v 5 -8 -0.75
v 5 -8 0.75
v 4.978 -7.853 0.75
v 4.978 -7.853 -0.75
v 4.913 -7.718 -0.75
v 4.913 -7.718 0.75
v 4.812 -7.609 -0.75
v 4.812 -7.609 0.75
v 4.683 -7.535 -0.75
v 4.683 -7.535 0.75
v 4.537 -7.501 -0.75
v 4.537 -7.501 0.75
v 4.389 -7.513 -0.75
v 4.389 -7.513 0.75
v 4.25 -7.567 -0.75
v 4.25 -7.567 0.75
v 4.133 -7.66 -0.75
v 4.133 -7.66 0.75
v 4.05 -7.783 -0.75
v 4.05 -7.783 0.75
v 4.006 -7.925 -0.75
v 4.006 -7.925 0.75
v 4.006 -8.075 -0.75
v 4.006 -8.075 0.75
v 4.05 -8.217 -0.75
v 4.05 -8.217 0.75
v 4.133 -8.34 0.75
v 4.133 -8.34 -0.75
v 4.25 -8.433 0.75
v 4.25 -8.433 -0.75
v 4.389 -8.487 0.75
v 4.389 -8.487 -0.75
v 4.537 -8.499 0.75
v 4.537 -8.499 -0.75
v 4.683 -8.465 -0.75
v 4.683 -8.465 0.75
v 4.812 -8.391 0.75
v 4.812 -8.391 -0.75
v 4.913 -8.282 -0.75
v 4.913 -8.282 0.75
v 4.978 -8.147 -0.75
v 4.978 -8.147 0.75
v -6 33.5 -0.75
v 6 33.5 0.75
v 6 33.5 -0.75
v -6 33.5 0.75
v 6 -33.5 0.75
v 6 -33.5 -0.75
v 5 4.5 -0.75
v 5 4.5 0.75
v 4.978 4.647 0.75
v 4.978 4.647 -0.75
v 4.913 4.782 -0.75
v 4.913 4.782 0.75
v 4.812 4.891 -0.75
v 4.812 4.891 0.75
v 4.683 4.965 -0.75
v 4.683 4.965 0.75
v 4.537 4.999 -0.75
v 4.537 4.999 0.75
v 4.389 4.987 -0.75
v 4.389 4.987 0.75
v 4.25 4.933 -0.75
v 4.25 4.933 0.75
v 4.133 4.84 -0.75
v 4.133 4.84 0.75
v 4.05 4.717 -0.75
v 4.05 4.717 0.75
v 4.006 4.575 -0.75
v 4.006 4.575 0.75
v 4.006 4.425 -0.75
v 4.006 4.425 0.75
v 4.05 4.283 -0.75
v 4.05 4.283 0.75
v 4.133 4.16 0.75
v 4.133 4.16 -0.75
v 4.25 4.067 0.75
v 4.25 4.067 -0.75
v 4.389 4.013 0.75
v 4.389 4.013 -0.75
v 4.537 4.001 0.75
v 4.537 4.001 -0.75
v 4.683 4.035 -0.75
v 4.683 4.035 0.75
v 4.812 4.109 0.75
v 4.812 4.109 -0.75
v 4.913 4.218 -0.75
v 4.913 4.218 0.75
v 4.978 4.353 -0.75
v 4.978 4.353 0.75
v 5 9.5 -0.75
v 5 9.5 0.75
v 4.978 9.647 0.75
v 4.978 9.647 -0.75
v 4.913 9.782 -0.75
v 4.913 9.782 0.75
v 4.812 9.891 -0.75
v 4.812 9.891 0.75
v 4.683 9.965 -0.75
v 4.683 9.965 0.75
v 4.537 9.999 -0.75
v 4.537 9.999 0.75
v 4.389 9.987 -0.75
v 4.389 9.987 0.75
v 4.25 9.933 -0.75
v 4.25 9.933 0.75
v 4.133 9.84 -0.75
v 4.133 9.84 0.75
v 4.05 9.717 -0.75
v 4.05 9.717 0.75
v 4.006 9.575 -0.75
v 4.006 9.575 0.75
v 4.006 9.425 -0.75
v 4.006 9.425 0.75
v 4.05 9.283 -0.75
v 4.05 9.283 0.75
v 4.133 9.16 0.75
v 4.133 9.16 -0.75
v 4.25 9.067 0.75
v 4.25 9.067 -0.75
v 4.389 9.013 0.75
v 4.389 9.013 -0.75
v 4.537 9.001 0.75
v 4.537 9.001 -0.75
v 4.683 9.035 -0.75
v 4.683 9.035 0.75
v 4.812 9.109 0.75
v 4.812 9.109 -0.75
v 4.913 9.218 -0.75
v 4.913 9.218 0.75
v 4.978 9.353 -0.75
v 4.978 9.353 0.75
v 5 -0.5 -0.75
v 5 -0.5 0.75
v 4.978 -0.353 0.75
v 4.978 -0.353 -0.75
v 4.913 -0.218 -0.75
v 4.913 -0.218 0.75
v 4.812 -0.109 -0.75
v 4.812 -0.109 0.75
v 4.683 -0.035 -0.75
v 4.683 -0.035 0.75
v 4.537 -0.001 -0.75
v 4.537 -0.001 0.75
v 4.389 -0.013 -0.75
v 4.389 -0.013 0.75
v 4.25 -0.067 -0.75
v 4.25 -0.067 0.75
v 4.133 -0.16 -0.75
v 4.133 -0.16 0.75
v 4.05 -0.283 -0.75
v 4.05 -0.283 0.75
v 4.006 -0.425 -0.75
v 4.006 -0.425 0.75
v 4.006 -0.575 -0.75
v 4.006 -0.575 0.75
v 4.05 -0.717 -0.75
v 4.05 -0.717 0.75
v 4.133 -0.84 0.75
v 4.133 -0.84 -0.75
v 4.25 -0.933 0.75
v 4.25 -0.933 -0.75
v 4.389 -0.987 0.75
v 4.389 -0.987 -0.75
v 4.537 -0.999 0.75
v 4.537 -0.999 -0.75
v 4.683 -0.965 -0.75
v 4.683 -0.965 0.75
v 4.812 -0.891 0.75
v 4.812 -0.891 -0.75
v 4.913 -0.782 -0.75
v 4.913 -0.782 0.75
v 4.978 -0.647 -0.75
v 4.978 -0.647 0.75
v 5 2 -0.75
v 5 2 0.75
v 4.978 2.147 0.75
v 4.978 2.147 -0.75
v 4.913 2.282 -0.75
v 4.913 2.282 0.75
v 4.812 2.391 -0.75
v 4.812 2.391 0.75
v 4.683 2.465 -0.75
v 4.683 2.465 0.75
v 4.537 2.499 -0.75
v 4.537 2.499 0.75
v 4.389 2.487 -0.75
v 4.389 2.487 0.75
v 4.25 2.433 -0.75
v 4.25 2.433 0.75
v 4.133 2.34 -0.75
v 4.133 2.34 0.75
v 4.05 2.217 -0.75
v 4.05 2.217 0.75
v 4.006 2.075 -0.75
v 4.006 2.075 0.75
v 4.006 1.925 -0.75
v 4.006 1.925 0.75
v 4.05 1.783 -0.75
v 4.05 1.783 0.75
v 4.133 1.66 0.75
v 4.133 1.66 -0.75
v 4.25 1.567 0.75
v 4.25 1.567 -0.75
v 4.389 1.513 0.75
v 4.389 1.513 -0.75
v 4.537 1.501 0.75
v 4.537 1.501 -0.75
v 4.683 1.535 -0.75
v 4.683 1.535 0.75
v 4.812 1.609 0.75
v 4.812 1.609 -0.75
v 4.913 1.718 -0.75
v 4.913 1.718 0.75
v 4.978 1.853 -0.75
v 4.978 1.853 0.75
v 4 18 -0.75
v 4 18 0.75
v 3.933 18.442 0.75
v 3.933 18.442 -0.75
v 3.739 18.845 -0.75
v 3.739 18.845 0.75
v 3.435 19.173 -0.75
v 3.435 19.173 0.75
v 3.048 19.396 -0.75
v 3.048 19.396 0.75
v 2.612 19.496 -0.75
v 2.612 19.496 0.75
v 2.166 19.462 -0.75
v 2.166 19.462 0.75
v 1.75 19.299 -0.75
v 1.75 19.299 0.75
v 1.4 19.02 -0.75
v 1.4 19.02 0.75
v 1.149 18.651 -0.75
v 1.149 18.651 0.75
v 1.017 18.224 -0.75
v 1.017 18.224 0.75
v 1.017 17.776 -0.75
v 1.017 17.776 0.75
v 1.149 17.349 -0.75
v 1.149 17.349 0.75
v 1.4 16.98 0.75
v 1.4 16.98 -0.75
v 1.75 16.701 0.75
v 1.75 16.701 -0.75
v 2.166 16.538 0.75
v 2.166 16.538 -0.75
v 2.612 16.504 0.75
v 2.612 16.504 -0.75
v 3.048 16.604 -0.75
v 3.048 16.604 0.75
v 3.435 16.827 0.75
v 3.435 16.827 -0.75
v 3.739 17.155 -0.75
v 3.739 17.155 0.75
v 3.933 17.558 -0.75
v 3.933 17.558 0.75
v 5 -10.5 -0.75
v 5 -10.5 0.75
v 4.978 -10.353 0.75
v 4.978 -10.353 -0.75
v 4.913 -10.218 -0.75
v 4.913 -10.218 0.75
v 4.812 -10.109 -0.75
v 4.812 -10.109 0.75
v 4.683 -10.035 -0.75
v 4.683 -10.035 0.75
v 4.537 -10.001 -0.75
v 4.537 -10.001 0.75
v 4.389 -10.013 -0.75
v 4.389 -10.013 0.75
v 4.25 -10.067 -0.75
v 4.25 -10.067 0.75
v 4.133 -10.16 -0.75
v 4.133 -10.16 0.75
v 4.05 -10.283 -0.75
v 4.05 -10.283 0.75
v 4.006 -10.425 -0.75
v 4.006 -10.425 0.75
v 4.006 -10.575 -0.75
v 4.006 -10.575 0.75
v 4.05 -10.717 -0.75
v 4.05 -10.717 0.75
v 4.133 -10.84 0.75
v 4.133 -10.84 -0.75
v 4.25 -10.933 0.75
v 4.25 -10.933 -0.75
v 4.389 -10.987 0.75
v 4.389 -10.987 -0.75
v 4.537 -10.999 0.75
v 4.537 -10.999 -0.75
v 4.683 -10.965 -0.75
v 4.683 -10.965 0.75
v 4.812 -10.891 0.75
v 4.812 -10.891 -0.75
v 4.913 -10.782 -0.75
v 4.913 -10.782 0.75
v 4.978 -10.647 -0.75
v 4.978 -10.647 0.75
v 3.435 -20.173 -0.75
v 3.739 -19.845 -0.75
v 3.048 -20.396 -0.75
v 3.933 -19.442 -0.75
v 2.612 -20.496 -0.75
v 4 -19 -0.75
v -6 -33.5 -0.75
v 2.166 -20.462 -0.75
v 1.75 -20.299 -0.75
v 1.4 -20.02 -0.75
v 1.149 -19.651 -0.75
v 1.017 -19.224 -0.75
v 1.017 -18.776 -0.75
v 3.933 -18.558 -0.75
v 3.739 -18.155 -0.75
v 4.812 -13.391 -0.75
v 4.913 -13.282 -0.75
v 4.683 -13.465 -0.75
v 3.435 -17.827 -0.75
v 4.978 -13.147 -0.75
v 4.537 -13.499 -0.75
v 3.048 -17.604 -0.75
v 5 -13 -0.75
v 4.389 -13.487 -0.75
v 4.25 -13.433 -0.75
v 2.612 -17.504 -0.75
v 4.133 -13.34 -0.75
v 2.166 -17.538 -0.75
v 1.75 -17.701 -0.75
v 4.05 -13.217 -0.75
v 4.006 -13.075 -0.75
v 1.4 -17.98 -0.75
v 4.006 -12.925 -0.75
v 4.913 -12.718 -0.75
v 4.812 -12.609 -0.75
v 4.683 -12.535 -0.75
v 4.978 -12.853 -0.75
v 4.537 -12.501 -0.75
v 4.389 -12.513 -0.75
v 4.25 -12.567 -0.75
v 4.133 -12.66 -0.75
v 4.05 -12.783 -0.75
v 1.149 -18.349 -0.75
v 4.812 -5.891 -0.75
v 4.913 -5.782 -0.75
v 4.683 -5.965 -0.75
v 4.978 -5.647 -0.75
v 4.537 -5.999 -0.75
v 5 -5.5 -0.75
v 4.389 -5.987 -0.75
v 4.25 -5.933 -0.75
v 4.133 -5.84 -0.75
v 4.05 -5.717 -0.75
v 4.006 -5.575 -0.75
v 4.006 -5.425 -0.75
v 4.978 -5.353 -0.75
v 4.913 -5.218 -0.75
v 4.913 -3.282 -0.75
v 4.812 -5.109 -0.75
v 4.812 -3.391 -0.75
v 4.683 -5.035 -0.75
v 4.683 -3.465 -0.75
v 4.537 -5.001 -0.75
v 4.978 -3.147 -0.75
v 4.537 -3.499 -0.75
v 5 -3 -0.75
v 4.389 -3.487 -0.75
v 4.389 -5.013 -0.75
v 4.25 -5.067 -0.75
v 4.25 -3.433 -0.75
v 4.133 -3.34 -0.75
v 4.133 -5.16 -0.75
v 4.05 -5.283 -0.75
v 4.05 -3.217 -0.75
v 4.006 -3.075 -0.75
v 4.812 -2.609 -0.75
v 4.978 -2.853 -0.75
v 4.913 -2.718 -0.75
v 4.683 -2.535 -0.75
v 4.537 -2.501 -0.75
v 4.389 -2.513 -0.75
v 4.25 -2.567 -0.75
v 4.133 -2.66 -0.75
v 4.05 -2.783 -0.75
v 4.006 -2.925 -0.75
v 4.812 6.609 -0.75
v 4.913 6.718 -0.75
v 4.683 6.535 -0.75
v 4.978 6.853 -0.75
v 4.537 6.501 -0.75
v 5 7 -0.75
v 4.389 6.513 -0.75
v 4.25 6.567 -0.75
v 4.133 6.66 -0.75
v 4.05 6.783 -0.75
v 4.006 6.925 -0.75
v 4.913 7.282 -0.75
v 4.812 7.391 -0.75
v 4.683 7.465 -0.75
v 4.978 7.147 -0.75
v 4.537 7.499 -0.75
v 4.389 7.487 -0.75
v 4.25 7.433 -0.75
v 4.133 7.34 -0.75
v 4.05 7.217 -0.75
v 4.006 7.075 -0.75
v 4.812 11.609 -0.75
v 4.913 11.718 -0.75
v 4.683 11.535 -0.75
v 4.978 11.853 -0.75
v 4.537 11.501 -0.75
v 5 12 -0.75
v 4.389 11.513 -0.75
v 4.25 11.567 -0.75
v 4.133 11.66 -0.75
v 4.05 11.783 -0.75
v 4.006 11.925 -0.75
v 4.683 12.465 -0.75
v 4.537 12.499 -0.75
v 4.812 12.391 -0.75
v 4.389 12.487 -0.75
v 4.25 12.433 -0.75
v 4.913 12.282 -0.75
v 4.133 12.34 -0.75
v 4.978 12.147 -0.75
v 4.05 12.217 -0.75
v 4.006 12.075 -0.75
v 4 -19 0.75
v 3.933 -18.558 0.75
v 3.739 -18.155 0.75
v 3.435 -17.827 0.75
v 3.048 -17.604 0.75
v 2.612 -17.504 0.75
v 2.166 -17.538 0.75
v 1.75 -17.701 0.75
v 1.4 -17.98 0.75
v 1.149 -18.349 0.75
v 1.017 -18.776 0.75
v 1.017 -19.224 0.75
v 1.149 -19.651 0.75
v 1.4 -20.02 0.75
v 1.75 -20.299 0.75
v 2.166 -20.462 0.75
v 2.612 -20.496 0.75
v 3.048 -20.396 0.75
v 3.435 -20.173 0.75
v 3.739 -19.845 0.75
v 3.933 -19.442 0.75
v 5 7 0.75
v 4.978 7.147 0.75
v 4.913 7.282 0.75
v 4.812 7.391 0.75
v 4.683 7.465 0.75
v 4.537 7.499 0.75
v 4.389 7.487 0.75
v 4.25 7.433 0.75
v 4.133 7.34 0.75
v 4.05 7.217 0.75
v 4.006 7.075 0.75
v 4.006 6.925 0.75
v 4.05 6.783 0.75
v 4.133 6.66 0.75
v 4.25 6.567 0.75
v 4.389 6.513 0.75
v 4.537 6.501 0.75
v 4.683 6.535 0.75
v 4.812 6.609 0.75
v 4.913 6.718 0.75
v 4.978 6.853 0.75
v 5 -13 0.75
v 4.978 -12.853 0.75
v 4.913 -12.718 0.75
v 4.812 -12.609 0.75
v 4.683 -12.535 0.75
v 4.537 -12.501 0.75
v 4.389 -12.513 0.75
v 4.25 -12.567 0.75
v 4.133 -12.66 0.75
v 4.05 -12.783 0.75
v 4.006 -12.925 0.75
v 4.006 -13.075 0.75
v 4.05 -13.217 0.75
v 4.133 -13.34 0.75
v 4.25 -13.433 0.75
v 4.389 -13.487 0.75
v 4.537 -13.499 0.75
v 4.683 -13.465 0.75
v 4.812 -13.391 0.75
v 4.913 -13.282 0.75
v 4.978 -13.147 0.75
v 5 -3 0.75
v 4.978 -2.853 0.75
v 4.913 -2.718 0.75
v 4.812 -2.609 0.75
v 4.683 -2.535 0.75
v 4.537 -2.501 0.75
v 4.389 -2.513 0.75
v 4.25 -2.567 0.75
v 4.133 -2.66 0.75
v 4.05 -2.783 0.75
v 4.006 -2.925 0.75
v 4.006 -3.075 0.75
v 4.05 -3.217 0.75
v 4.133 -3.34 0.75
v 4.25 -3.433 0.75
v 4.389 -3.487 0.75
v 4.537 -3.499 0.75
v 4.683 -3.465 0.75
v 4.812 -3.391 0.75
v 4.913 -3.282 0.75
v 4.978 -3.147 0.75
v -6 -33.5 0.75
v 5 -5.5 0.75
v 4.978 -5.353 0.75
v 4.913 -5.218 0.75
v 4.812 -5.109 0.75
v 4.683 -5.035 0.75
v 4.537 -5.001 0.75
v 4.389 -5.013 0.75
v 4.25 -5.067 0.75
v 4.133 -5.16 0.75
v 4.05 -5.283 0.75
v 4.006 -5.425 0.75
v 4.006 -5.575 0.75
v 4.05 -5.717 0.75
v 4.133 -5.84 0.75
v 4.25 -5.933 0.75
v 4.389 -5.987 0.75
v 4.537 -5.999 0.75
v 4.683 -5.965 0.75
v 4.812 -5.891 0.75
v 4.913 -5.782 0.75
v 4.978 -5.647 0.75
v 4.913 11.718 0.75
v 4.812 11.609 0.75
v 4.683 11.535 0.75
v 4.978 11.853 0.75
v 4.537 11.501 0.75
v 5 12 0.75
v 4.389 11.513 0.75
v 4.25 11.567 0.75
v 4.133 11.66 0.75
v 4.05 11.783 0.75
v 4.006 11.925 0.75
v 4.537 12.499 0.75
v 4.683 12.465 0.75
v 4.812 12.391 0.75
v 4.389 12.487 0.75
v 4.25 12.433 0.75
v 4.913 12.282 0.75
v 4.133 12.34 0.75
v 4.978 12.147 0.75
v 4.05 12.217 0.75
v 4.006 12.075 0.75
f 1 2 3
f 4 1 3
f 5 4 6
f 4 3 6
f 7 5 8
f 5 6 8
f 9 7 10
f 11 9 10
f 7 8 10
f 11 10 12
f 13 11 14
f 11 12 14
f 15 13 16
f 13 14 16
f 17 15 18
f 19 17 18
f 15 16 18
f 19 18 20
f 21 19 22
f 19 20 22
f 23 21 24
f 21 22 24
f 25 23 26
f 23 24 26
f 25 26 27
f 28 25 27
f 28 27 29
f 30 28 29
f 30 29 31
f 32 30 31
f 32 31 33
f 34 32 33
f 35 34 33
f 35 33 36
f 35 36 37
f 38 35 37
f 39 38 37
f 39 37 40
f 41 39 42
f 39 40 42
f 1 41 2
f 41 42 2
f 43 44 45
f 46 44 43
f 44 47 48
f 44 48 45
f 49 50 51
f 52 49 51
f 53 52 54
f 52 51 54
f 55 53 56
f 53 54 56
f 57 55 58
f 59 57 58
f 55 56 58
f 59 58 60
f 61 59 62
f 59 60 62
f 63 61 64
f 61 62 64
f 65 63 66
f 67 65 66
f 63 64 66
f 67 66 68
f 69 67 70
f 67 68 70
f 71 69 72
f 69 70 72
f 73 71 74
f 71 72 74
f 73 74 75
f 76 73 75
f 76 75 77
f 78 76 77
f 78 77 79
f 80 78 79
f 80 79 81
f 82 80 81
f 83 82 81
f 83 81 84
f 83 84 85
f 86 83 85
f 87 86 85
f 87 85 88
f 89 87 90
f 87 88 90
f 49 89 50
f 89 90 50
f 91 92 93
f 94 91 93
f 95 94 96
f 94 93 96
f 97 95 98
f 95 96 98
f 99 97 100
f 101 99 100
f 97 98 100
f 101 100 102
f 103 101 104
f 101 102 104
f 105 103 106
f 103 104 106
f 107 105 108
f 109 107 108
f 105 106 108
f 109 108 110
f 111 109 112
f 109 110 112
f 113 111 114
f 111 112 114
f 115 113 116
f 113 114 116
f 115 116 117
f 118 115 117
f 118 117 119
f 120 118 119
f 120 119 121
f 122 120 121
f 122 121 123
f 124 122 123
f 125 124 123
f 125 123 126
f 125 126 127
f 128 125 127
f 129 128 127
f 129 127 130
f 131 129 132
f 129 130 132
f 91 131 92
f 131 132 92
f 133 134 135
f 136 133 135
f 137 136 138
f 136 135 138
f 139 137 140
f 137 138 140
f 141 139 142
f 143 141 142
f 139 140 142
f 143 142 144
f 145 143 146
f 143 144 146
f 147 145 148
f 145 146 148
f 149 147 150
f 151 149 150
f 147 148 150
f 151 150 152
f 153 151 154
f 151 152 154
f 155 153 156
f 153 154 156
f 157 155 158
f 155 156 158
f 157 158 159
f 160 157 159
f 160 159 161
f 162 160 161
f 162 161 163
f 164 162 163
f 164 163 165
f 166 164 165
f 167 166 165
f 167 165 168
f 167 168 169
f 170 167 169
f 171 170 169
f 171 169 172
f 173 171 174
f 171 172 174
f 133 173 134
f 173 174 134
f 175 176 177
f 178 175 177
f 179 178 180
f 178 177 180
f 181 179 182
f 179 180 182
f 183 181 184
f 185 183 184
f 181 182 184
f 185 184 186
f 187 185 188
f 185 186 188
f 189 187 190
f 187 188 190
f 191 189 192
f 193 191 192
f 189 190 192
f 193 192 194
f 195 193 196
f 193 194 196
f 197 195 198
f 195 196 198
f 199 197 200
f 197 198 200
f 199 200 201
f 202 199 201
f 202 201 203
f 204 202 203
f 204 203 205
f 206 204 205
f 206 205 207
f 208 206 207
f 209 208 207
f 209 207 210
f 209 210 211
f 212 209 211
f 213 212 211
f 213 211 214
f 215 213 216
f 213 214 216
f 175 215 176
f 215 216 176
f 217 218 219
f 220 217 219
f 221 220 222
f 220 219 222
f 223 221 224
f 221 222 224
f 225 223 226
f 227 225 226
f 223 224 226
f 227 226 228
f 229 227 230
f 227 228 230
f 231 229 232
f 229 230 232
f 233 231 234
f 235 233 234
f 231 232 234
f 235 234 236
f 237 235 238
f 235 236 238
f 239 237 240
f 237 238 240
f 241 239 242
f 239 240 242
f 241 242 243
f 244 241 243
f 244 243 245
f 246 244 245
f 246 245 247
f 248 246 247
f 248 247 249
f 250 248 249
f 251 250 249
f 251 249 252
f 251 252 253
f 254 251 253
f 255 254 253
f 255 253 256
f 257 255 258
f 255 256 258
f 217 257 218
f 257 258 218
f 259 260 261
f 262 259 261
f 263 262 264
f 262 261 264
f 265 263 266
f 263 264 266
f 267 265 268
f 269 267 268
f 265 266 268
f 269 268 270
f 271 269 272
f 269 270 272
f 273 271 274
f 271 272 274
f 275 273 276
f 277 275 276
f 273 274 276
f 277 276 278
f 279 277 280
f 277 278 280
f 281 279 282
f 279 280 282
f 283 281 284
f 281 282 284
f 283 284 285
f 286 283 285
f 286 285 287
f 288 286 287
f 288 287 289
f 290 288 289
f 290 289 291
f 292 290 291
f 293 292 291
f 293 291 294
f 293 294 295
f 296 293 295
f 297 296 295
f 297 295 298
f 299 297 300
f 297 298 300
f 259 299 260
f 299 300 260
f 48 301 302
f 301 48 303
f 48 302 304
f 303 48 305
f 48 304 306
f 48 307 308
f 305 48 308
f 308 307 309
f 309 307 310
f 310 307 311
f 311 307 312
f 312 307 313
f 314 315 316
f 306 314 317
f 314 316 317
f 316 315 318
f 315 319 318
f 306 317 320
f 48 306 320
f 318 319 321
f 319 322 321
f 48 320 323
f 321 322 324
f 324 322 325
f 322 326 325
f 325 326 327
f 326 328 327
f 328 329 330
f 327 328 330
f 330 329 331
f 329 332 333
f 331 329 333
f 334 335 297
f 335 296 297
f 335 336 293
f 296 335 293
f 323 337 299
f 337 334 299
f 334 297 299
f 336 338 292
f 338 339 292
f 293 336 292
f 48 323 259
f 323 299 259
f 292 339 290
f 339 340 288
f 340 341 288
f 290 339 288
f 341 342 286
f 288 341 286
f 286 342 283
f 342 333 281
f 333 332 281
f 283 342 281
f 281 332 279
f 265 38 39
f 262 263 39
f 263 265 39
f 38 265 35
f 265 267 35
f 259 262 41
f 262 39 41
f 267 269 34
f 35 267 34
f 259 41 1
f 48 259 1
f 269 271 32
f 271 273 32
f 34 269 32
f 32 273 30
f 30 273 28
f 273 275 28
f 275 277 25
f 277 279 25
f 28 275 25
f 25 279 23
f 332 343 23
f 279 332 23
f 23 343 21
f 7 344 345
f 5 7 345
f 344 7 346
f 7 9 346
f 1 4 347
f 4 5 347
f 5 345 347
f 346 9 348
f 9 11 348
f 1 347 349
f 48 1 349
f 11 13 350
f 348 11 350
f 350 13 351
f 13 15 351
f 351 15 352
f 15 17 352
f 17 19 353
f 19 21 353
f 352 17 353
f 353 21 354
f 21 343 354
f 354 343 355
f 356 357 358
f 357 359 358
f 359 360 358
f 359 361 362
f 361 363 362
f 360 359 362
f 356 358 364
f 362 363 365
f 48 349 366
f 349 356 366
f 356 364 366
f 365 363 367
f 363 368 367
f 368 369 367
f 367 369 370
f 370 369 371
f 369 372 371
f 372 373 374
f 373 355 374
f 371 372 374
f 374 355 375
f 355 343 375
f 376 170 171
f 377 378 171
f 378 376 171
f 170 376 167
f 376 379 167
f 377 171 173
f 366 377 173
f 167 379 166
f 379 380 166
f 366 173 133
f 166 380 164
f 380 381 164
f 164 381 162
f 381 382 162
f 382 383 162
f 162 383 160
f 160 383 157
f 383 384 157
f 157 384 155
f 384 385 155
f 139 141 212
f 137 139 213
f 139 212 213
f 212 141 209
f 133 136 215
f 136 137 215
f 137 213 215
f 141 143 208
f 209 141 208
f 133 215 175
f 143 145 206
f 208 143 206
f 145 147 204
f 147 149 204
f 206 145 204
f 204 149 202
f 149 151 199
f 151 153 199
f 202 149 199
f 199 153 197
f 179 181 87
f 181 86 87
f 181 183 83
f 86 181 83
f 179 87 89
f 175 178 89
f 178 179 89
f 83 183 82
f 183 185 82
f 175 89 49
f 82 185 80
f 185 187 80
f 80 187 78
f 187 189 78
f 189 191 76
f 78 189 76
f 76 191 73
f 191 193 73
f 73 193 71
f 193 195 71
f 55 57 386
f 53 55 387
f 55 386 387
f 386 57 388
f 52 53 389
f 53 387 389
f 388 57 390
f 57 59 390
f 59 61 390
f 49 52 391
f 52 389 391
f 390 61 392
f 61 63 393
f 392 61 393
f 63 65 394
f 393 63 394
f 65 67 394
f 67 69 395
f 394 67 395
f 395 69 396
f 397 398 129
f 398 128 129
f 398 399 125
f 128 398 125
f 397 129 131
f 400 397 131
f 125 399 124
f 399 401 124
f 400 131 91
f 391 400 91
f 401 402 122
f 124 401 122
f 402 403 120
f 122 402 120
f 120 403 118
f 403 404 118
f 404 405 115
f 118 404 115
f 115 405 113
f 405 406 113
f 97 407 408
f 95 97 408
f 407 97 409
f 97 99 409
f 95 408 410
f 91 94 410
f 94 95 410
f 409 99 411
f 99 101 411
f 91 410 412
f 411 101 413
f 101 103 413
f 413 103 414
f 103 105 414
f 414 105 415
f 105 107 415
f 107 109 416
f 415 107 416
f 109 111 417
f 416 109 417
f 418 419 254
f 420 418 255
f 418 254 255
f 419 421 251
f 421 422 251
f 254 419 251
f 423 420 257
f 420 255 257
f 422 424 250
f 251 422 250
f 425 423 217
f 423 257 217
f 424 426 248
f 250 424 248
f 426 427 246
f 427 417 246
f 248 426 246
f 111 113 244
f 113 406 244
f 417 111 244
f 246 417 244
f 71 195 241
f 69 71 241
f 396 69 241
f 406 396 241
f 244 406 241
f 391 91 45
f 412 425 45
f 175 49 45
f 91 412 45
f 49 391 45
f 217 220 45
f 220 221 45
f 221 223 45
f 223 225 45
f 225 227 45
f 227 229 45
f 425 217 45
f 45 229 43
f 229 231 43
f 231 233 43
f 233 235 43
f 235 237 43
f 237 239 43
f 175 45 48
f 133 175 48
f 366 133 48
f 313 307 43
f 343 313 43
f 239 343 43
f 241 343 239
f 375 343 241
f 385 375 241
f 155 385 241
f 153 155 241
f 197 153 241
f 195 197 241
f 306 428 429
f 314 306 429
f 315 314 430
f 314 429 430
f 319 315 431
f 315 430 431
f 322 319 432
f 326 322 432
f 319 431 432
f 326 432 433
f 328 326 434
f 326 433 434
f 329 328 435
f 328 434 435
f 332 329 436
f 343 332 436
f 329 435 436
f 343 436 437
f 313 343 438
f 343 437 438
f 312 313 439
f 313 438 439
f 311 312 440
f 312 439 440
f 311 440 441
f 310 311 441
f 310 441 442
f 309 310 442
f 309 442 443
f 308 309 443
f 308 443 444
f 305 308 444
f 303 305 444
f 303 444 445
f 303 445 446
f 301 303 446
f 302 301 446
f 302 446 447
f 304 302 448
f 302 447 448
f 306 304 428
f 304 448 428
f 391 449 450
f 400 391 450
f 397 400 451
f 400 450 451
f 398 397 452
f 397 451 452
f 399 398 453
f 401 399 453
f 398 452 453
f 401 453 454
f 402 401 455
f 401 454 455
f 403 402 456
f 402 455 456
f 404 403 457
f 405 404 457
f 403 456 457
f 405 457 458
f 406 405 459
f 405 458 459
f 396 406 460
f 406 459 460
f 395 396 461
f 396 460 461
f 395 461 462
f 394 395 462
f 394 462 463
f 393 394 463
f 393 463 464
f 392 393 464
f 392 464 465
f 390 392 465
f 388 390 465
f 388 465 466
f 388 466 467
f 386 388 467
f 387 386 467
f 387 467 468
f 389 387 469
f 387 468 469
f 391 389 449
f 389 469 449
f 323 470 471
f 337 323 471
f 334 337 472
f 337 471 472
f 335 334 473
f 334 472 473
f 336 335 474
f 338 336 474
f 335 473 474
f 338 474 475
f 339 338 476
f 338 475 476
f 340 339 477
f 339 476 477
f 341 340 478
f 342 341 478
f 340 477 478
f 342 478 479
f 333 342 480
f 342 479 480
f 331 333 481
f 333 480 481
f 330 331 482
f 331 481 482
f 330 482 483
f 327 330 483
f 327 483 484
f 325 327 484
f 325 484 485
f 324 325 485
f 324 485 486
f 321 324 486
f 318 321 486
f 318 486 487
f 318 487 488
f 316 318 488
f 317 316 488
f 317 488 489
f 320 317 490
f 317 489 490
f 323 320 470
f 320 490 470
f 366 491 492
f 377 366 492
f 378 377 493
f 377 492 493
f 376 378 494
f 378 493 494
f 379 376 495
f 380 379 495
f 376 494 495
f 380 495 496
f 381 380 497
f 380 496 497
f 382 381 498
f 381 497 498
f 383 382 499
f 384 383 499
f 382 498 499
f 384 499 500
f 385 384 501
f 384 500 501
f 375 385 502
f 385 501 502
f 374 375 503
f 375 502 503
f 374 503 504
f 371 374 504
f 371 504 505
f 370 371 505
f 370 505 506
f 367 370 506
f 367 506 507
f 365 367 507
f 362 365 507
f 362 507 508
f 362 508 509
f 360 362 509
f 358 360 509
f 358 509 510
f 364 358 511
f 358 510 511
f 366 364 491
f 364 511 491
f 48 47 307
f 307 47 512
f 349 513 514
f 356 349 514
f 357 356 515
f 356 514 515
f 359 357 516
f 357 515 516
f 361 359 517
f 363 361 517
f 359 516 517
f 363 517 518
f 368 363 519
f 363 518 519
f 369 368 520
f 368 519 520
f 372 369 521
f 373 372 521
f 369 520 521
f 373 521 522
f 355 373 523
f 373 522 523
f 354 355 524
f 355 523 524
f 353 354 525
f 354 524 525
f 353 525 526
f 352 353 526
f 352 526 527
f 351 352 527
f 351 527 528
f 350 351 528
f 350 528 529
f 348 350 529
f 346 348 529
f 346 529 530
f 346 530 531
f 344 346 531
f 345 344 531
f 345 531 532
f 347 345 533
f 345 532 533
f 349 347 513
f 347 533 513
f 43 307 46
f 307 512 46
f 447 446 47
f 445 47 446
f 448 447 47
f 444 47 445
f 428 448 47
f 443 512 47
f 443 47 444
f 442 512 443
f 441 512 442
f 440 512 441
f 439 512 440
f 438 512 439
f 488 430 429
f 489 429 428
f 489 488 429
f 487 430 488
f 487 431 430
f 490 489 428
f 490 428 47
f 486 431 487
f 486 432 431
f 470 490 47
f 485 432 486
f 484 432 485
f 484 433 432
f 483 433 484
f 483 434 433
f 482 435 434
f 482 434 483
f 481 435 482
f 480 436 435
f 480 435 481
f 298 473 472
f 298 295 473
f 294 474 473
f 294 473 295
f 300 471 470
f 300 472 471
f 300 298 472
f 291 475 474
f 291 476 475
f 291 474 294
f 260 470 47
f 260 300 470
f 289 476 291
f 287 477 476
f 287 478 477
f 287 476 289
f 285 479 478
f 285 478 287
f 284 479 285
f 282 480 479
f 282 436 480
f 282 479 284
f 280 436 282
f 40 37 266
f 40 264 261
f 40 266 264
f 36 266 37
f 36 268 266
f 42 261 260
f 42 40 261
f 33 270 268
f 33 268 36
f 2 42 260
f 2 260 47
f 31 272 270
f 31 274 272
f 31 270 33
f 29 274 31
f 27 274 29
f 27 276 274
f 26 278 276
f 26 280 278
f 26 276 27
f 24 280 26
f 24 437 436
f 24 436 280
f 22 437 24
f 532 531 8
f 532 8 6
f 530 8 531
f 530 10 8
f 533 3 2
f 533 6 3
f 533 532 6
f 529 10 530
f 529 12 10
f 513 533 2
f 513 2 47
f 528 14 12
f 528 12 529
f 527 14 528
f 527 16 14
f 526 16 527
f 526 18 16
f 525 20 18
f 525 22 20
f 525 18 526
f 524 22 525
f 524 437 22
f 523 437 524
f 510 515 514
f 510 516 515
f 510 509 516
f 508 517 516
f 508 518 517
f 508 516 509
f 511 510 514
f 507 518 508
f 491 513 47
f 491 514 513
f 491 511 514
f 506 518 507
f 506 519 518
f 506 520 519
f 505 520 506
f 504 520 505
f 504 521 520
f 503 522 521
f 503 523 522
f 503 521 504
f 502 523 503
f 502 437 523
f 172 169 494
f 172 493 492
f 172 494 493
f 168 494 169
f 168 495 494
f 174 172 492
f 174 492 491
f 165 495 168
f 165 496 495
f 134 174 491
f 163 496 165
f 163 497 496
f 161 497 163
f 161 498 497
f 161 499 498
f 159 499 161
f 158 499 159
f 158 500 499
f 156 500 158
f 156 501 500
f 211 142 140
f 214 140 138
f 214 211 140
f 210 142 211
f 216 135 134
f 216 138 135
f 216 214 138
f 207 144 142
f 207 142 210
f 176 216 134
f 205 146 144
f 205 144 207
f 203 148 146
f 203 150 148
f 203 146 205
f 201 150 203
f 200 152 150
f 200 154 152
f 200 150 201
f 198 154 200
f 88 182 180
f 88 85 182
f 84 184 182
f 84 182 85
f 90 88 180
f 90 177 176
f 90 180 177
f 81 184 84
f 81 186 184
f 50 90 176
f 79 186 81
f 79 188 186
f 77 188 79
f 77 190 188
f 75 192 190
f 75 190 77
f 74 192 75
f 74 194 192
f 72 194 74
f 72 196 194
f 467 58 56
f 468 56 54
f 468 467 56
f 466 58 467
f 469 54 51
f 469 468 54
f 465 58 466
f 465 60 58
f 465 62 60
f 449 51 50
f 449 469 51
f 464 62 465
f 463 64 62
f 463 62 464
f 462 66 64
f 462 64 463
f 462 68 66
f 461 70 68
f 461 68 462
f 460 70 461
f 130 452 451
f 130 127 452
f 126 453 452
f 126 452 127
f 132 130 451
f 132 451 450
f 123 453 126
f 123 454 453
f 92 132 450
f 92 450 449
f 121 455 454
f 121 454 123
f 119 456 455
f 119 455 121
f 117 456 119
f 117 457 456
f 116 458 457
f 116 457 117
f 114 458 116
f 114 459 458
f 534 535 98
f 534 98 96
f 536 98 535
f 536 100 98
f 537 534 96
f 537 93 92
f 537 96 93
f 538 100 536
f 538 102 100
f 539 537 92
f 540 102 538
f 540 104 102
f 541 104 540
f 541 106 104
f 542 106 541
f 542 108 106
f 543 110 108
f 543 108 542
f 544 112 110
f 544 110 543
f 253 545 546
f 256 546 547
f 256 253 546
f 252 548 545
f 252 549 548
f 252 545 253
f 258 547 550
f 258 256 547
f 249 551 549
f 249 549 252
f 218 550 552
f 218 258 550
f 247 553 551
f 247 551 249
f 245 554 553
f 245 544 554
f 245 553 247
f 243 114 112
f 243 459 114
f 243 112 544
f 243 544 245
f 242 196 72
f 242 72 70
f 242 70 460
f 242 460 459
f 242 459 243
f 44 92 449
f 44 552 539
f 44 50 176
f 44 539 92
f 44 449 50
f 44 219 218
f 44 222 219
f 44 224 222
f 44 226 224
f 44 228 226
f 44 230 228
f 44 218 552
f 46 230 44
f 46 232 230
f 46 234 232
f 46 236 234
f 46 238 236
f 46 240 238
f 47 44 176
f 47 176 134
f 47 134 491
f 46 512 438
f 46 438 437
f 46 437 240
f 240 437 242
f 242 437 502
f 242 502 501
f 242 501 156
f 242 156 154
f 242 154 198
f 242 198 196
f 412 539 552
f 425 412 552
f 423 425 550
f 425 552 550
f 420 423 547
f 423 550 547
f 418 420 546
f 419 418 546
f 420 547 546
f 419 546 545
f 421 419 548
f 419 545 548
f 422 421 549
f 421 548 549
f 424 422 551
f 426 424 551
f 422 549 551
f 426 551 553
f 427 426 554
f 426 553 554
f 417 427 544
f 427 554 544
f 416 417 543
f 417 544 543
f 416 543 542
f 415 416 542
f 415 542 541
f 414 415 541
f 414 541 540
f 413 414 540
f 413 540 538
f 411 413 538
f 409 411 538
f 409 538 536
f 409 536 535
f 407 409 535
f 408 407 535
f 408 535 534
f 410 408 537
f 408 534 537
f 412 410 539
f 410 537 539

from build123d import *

# Parameters (mm, degrees)
SKETCH1_W           = 67
SKETCH1_H           = 12
BOSS_EXTRUDE1_DEPTH = 0.75
SKETCH2_R           = 0.5
CUT_EXTRUDE1_DEPTH  = 1.5
SKETCH3_R           = 1.5
CUT_EXTRUDE2_DEPTH  = 1.5


with BuildPart() as part:
    # Sketch1 → Boss-Extrude1 (new, symmetric)
    with BuildSketch(Plane(origin=(0, 0, 0), x_dir=(0, 1, 0), z_dir=(0, 0, 1))):
        Rectangle(SKETCH1_W, SKETCH1_H)
    extrude(amount=BOSS_EXTRUDE1_DEPTH, both=True)

    # Sketch2 → Cut-Extrude1 (cut)
    with BuildSketch(Plane.XY.offset(0.75)):
        with Locations((4.5, -13)):
            Circle(SKETCH2_R)
        with Locations((4.5, -10.5)):
            Circle(SKETCH2_R)
        with Locations((4.5, -8)):
            Circle(SKETCH2_R)
        with Locations((4.5, -5.5)):
            Circle(SKETCH2_R)
        with Locations((4.5, -3)):
            Circle(SKETCH2_R)
        with Locations((4.5, -0.5)):
            Circle(SKETCH2_R)
        with Locations((4.5, 2)):
            Circle(SKETCH2_R)
        with Locations((4.5, 4.5)):
            Circle(SKETCH2_R)
        with Locations((4.5, 7)):
            Circle(SKETCH2_R)
        with Locations((4.5, 9.5)):
            Circle(SKETCH2_R)
        with Locations((4.5, 12)):
            Circle(SKETCH2_R)
    extrude(amount=-CUT_EXTRUDE1_DEPTH, mode=Mode.SUBTRACT)

    # Sketch3 → Cut-Extrude2 (cut)
    with BuildSketch(Plane.XY.offset(0.75)):
        with Locations((2.5, -19)):
            Circle(SKETCH3_R)
        with Locations((2.5, 18)):
            Circle(SKETCH3_R)
    extrude(amount=-CUT_EXTRUDE2_DEPTH, mode=Mode.SUBTRACT)


solid = part.part
